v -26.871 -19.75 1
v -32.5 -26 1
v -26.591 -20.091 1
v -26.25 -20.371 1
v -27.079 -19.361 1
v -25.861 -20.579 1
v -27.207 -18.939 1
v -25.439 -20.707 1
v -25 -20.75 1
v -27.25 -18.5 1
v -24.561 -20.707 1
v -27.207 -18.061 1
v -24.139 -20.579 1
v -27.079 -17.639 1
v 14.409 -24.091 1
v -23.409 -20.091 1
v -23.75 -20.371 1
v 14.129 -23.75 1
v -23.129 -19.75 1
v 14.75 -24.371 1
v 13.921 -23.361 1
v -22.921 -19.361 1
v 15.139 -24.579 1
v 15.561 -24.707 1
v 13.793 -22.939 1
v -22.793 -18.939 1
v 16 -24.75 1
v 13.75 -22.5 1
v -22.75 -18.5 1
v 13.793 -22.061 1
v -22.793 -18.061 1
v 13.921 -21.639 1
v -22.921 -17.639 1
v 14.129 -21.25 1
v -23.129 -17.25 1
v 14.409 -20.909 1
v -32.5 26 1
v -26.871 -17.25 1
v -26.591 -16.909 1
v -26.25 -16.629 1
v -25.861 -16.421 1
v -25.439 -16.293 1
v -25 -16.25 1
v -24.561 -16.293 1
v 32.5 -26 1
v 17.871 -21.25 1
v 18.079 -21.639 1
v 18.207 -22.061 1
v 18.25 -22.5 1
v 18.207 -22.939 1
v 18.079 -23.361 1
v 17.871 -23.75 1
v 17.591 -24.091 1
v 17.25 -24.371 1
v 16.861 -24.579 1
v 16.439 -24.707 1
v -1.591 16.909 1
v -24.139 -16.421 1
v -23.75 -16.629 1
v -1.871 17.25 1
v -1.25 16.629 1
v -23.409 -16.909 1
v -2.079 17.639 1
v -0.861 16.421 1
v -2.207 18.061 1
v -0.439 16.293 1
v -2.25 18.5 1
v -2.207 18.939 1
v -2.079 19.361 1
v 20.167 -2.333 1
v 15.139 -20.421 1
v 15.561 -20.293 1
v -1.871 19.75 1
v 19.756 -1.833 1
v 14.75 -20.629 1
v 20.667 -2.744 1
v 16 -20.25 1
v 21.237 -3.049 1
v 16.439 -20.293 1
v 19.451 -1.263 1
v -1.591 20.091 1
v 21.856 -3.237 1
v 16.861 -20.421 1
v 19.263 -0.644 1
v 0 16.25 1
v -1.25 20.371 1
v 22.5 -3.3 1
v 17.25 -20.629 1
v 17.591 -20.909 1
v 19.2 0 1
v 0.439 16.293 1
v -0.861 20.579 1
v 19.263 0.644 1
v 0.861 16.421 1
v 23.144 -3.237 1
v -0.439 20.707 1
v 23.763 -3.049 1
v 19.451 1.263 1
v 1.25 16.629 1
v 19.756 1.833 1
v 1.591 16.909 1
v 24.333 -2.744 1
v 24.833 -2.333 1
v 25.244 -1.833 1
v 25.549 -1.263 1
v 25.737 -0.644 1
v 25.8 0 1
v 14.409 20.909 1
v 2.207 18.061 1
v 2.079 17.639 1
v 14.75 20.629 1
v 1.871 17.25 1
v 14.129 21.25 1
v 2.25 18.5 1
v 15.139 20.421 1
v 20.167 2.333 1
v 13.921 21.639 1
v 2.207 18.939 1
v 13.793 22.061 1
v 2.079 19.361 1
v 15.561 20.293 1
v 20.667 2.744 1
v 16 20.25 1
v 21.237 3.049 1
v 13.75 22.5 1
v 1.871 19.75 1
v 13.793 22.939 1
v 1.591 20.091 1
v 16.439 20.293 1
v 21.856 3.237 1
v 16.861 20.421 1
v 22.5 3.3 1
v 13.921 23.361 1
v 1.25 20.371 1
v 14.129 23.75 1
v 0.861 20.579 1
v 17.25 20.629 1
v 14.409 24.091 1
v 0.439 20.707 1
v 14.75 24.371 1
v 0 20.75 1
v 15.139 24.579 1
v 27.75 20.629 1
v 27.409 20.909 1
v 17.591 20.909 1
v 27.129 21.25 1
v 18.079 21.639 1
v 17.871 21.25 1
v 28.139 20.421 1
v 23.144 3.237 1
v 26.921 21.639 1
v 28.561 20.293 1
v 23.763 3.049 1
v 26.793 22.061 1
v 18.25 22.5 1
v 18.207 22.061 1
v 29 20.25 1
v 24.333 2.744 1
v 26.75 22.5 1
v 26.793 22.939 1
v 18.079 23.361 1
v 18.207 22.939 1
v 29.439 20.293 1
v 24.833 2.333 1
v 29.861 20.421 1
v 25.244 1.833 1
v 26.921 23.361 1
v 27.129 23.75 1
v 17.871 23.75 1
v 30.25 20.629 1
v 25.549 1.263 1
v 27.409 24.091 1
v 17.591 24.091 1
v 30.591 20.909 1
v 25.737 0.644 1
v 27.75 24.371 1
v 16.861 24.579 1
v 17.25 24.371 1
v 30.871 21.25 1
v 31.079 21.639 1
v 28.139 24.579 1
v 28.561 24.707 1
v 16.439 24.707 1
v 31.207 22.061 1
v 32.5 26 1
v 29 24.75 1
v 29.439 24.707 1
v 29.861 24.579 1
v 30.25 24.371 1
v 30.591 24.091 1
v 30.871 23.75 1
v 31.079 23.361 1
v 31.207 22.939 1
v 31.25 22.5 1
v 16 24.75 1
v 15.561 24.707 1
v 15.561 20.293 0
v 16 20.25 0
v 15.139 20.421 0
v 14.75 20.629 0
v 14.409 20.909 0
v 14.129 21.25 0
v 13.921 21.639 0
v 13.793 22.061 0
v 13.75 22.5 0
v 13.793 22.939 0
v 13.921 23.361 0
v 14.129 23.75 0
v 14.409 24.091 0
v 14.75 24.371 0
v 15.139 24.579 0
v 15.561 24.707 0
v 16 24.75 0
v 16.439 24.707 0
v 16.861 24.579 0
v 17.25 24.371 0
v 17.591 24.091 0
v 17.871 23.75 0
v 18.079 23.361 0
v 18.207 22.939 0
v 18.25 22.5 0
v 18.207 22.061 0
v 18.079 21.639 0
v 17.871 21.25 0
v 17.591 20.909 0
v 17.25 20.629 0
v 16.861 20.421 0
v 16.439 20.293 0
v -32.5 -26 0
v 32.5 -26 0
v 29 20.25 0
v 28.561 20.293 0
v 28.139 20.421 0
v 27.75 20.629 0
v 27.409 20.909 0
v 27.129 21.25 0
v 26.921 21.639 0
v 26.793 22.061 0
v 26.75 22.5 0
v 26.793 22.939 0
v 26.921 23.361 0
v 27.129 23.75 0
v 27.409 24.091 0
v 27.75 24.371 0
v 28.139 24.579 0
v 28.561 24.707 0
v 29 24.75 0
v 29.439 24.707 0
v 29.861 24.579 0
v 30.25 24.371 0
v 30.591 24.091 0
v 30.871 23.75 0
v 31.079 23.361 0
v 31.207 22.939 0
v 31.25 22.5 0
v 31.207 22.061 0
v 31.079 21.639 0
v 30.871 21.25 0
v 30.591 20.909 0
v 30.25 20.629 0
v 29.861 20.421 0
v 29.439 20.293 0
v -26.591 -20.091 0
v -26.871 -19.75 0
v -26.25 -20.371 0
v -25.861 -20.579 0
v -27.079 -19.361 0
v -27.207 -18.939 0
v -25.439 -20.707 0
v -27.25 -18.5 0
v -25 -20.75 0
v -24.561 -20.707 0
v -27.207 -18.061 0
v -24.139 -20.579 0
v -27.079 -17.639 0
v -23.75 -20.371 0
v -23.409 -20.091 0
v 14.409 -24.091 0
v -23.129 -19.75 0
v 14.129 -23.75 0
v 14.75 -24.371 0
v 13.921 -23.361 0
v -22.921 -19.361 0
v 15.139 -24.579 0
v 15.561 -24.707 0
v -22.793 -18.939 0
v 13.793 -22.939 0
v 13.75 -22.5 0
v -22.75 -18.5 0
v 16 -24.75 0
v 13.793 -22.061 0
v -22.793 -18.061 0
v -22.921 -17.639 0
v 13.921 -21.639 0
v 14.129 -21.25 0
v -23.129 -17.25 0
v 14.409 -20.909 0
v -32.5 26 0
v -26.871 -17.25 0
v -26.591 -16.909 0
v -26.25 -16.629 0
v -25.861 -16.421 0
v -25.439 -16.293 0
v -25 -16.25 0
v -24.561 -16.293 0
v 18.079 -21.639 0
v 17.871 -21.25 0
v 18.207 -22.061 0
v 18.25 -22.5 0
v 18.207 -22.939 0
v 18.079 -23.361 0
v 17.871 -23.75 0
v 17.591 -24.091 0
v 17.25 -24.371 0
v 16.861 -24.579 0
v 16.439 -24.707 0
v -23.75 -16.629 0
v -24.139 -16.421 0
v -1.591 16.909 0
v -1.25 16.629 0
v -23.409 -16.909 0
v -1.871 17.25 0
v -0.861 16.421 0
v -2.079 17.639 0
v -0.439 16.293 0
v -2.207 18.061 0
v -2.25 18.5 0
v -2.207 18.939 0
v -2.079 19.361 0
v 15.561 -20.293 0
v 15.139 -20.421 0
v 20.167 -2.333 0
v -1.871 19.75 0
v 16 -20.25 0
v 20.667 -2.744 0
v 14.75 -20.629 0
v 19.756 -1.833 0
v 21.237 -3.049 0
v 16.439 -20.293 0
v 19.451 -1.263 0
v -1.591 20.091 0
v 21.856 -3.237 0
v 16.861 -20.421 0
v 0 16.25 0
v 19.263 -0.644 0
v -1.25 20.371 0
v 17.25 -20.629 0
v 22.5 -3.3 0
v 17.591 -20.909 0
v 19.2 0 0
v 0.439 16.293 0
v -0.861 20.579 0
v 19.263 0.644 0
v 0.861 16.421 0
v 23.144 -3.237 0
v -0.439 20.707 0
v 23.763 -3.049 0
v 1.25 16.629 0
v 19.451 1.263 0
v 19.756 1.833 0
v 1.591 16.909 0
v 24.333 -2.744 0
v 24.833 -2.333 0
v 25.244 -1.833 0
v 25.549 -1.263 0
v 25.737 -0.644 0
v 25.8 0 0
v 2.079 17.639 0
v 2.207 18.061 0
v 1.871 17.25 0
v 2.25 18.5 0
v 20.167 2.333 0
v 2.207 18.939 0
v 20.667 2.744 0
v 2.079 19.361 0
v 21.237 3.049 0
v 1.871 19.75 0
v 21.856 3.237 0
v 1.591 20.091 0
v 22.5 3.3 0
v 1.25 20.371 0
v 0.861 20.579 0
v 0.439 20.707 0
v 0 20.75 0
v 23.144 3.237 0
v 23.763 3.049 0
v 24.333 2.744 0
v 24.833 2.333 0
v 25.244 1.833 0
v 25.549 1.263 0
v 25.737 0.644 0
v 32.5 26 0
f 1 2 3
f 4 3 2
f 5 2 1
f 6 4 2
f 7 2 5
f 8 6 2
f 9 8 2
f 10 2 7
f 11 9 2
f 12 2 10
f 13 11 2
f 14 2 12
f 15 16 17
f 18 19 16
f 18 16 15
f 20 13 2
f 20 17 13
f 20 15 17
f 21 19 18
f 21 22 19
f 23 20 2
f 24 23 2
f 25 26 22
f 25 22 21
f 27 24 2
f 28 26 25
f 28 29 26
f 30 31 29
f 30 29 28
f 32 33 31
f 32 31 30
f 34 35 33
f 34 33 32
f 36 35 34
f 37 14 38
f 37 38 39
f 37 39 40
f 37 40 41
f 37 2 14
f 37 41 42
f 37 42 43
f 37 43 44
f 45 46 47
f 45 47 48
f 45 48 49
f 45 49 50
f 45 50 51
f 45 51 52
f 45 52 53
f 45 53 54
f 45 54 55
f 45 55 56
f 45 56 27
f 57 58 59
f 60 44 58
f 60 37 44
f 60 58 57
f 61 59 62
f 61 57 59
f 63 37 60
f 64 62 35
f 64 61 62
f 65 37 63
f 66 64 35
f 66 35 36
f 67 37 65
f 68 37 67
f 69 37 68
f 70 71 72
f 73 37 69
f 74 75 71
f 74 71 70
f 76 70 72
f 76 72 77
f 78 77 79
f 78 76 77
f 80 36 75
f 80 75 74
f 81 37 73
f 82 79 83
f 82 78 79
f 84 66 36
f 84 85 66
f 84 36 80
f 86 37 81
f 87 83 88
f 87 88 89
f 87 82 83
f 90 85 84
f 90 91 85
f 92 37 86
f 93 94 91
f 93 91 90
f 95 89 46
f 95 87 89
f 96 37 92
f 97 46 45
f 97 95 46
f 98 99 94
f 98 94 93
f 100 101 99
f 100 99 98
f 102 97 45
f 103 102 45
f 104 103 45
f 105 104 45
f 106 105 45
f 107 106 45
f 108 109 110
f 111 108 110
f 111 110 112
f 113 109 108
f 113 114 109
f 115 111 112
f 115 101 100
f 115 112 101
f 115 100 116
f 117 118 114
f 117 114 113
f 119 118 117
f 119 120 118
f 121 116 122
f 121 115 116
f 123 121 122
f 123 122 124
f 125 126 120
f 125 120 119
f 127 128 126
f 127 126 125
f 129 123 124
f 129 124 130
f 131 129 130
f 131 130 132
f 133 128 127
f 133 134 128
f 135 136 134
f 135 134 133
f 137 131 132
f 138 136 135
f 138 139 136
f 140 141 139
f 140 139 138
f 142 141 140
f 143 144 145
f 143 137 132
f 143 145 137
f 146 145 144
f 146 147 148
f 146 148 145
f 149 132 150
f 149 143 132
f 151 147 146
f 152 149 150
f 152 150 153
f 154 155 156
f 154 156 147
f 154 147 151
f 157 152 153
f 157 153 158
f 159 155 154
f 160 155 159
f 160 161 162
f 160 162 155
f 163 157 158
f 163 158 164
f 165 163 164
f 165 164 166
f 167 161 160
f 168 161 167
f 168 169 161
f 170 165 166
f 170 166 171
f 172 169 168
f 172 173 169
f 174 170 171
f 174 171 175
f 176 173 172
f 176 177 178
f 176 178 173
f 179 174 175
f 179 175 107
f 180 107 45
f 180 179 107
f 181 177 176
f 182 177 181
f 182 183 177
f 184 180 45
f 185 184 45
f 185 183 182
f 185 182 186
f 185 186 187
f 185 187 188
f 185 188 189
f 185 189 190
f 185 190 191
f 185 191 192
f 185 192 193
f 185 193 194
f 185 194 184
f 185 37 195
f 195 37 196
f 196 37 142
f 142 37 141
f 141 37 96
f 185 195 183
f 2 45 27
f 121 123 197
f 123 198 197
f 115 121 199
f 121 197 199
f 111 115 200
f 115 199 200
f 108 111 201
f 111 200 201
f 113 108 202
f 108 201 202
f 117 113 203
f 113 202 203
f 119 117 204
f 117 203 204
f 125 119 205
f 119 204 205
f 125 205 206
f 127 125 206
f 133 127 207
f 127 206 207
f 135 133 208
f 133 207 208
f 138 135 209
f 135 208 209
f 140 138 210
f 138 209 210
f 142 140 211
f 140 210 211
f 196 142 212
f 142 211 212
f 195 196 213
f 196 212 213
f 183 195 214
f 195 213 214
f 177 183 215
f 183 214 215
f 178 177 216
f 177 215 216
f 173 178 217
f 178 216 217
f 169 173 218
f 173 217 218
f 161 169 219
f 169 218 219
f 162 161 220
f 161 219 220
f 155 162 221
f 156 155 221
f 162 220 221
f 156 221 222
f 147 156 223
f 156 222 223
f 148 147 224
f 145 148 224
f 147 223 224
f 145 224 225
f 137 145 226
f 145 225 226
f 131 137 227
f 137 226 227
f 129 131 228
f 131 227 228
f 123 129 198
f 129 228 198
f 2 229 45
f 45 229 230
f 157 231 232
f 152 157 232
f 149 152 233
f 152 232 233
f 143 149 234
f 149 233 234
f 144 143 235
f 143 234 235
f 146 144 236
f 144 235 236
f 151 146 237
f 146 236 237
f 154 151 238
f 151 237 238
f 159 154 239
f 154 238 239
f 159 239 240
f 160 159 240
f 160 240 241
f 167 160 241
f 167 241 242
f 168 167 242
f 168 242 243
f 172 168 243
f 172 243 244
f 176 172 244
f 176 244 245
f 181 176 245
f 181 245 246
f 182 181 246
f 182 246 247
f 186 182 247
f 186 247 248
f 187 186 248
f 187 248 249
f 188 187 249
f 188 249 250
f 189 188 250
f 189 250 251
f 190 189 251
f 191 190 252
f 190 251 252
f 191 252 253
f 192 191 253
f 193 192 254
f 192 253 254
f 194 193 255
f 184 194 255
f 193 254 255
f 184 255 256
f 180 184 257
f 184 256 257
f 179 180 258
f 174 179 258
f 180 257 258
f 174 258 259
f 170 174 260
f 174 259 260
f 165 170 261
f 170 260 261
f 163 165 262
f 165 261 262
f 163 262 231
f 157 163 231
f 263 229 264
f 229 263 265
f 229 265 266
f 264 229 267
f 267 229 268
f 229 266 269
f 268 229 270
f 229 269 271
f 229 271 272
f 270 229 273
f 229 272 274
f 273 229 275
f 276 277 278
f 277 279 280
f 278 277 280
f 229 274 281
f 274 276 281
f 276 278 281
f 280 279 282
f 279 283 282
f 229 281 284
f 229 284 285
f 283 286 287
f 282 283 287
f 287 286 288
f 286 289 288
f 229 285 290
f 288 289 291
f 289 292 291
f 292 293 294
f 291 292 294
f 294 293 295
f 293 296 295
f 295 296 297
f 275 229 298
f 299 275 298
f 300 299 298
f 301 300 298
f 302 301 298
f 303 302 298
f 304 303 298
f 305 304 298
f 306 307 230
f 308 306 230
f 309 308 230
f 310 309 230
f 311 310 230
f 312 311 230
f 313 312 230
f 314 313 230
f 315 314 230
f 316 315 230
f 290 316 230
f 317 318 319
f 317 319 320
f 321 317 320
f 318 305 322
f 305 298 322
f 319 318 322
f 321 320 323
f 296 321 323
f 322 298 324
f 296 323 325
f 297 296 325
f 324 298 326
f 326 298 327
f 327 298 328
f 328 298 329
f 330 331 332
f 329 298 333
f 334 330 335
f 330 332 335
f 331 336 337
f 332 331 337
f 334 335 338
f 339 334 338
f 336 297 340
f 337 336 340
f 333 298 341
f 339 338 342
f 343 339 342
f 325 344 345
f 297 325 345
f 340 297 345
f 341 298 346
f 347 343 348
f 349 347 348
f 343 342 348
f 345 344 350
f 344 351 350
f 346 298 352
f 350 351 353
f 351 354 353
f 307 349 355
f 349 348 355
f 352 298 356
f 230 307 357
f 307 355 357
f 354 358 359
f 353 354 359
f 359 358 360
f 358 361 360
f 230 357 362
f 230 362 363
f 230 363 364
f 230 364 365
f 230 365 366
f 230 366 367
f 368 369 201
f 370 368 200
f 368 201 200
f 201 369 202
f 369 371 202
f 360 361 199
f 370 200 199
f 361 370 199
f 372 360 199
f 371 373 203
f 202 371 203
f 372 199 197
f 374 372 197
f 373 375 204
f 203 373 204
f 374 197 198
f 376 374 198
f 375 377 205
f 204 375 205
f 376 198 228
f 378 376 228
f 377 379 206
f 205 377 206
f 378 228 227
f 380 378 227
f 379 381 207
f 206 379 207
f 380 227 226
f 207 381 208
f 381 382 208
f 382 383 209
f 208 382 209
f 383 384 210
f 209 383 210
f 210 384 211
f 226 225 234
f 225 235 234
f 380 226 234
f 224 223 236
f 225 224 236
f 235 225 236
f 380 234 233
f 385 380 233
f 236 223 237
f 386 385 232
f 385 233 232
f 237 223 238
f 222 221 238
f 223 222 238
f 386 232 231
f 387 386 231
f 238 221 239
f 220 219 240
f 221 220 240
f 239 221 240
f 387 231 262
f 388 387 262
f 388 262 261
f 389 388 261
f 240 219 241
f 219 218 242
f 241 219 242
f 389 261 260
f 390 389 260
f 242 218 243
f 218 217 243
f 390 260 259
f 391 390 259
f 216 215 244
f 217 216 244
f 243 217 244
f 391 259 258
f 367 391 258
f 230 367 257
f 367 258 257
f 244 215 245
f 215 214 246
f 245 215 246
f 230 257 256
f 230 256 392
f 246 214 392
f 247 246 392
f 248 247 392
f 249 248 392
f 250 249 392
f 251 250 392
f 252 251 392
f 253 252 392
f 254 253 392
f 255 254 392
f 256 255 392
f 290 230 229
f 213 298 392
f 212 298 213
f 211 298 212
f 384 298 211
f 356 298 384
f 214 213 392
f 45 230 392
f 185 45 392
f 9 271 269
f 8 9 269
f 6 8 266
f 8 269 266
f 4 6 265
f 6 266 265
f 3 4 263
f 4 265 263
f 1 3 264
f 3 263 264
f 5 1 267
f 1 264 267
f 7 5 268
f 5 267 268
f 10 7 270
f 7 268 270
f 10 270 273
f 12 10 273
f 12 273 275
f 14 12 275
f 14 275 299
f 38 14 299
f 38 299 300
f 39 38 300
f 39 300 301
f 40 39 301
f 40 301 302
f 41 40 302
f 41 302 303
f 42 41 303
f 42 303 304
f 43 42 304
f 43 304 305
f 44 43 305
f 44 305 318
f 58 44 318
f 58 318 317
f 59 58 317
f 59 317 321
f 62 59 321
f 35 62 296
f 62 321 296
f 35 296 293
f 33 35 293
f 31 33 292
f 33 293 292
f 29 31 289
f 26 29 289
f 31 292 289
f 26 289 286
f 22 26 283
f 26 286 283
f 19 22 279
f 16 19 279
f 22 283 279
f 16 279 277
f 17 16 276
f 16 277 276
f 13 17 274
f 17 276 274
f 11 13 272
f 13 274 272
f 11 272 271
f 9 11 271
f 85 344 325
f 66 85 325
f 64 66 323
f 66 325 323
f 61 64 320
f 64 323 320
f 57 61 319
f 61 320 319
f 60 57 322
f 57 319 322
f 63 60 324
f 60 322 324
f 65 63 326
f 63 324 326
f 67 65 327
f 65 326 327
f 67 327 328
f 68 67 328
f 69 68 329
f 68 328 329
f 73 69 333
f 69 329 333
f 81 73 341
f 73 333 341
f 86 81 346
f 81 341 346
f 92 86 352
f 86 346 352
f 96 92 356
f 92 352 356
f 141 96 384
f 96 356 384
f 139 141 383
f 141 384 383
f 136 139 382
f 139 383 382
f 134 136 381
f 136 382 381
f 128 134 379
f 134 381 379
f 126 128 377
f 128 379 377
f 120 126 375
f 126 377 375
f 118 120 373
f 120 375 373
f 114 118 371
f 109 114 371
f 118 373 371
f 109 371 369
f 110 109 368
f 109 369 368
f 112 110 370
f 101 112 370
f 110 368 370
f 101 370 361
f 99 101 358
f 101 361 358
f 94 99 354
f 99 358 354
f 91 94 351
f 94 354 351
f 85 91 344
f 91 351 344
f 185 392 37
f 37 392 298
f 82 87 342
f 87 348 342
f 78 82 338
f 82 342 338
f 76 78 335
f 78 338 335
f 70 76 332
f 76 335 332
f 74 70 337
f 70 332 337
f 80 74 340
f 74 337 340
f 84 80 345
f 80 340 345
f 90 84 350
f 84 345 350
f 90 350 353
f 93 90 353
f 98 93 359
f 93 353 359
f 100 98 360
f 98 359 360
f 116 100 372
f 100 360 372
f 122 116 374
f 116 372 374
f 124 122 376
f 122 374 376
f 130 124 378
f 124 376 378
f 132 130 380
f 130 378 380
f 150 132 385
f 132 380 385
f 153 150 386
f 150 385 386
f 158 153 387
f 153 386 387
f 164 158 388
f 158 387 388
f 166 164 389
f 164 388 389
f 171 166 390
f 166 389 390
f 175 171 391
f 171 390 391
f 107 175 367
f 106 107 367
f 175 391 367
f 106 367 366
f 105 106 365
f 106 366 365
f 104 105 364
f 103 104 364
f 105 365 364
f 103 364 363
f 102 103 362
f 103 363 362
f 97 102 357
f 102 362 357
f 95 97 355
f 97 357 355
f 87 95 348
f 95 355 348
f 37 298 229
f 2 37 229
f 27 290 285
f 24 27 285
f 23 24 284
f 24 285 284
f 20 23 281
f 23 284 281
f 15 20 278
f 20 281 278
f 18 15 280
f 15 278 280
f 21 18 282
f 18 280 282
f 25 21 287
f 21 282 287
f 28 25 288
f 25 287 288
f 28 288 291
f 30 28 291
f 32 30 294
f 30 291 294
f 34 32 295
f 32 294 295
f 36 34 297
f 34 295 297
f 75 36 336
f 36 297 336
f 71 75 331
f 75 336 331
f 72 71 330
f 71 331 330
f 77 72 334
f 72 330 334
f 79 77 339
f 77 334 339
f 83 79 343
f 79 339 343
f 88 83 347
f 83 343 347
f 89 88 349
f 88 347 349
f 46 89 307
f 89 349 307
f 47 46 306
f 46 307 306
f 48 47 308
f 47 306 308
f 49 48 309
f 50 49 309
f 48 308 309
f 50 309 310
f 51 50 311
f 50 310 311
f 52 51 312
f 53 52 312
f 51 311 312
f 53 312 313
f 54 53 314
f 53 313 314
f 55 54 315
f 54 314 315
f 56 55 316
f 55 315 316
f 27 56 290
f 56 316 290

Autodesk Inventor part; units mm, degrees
ref_plane "YZ Plane" through (0, 0, 0) normal (1, 0, 0) x (0, 1, 0)
ref_plane "XZ Plane" through (0, 0, 0) normal (0, 1, 0) x (-1, 0, 0)
ref_plane "XY Plane" through (0, 0, 0) normal (0, 0, 1) x (1, 0, 0)
sketch "Sketch1" plane through (0, 0, 0) normal (0, 0, 1) x (1, 0, 0)
  line L0 (-32.5, -26) -> (32.5, -26)
  line L1 (32.5, -26) -> (32.5, 26)
  line L2 (32.5, 26) -> (-32.5, 26)
  line L3 (-32.5, 26) -> (-32.5, -26)
  line L4 (-32.5, -26) -> (32.5, 26) construction
  line L5 (32.5, -26) -> (-32.5, 26) construction
  point P0 (0, 0)
  dimension "d0" = 65
  dimension "d1" = 52
extrude "Extrusion1" add sketch "Sketch1" along normal blind 1
sketch "Sketch4" plane through (0, 0, 1) normal (0, 0, 1) x (1, 0, 0)
  line L0 (29, -22.5) -> (16, -22.5) construction
  line L1 (16, -22.5) -> (16, 22.5) construction
  line L2 (16, 22.5) -> (29, 22.5) construction
  line L3 (29, 22.5) -> (29, -22.5) construction
  line L4 (29, -22.5) -> (16, 22.5) construction
  line L5 (16, -22.5) -> (29, 22.5) construction
  line L6 (32.5, -26) -> (32.5, 26) projected
  point P0 (0, 0)
  point P1 (22.5, 0)
  point P2 (22.5, 0)
  dimension "d20" = 13
  dimension "d31" = 3.5
  dimension "d32" = 45
hole "Hole3" at (16, 22.5, 1) at (29, 22.5, 1) at (16, -22.5, 1) direction (0, 0, -1) diameter 4.5 depth 8 tip angle 118 clearance for "Countersunk Flat Head Screw DIN EN ISO 2009" size "M4" standard "DIN"
sketch "Sketch5" plane through (0, 0, 1) normal (0, 0, 1) x (1, 0, 0)
  circle A0 centre (16, 22.5) radius 2.25 projected
  circle A1 centre (16, -22.5) radius 2.25 projected
  point P0 (0, 0)
  point P1 (-25, -18.5)
  point P2 (0, 18.5)
  dimension "d33" = 4
  dimension "d34" = 4
  dimension "d35" = 41
  dimension "d36" = 16
hole "Hole4" at (-25, -18.5, 1) at (0, 18.5, 1) direction (0, 0, -1) diameter 4.5 depth 8 tip angle 118 clearance for "Countersunk Flat Head Screw DIN EN ISO 2009" size "M4" standard "DIN"
sketch "Sketch6" plane through (0, 0, 1) normal (0, 0, 1) x (1, 0, 0)
  line L0 (32.5, -26) -> (32.5, 26) projected
  point P0 (0, 0)
  point P1 (22.5, 0)
  dimension "d44" = 10
hole "Hole5" at (22.5, 0, 1) direction (0, 0, -1) diameter 6.6 depth 8 tip angle 118 clearance for "Countersunk Flat Head Screw DIN EN ISO 2009" size "M6" standard "DIN"
properties part number "CU5" material "Copper"
